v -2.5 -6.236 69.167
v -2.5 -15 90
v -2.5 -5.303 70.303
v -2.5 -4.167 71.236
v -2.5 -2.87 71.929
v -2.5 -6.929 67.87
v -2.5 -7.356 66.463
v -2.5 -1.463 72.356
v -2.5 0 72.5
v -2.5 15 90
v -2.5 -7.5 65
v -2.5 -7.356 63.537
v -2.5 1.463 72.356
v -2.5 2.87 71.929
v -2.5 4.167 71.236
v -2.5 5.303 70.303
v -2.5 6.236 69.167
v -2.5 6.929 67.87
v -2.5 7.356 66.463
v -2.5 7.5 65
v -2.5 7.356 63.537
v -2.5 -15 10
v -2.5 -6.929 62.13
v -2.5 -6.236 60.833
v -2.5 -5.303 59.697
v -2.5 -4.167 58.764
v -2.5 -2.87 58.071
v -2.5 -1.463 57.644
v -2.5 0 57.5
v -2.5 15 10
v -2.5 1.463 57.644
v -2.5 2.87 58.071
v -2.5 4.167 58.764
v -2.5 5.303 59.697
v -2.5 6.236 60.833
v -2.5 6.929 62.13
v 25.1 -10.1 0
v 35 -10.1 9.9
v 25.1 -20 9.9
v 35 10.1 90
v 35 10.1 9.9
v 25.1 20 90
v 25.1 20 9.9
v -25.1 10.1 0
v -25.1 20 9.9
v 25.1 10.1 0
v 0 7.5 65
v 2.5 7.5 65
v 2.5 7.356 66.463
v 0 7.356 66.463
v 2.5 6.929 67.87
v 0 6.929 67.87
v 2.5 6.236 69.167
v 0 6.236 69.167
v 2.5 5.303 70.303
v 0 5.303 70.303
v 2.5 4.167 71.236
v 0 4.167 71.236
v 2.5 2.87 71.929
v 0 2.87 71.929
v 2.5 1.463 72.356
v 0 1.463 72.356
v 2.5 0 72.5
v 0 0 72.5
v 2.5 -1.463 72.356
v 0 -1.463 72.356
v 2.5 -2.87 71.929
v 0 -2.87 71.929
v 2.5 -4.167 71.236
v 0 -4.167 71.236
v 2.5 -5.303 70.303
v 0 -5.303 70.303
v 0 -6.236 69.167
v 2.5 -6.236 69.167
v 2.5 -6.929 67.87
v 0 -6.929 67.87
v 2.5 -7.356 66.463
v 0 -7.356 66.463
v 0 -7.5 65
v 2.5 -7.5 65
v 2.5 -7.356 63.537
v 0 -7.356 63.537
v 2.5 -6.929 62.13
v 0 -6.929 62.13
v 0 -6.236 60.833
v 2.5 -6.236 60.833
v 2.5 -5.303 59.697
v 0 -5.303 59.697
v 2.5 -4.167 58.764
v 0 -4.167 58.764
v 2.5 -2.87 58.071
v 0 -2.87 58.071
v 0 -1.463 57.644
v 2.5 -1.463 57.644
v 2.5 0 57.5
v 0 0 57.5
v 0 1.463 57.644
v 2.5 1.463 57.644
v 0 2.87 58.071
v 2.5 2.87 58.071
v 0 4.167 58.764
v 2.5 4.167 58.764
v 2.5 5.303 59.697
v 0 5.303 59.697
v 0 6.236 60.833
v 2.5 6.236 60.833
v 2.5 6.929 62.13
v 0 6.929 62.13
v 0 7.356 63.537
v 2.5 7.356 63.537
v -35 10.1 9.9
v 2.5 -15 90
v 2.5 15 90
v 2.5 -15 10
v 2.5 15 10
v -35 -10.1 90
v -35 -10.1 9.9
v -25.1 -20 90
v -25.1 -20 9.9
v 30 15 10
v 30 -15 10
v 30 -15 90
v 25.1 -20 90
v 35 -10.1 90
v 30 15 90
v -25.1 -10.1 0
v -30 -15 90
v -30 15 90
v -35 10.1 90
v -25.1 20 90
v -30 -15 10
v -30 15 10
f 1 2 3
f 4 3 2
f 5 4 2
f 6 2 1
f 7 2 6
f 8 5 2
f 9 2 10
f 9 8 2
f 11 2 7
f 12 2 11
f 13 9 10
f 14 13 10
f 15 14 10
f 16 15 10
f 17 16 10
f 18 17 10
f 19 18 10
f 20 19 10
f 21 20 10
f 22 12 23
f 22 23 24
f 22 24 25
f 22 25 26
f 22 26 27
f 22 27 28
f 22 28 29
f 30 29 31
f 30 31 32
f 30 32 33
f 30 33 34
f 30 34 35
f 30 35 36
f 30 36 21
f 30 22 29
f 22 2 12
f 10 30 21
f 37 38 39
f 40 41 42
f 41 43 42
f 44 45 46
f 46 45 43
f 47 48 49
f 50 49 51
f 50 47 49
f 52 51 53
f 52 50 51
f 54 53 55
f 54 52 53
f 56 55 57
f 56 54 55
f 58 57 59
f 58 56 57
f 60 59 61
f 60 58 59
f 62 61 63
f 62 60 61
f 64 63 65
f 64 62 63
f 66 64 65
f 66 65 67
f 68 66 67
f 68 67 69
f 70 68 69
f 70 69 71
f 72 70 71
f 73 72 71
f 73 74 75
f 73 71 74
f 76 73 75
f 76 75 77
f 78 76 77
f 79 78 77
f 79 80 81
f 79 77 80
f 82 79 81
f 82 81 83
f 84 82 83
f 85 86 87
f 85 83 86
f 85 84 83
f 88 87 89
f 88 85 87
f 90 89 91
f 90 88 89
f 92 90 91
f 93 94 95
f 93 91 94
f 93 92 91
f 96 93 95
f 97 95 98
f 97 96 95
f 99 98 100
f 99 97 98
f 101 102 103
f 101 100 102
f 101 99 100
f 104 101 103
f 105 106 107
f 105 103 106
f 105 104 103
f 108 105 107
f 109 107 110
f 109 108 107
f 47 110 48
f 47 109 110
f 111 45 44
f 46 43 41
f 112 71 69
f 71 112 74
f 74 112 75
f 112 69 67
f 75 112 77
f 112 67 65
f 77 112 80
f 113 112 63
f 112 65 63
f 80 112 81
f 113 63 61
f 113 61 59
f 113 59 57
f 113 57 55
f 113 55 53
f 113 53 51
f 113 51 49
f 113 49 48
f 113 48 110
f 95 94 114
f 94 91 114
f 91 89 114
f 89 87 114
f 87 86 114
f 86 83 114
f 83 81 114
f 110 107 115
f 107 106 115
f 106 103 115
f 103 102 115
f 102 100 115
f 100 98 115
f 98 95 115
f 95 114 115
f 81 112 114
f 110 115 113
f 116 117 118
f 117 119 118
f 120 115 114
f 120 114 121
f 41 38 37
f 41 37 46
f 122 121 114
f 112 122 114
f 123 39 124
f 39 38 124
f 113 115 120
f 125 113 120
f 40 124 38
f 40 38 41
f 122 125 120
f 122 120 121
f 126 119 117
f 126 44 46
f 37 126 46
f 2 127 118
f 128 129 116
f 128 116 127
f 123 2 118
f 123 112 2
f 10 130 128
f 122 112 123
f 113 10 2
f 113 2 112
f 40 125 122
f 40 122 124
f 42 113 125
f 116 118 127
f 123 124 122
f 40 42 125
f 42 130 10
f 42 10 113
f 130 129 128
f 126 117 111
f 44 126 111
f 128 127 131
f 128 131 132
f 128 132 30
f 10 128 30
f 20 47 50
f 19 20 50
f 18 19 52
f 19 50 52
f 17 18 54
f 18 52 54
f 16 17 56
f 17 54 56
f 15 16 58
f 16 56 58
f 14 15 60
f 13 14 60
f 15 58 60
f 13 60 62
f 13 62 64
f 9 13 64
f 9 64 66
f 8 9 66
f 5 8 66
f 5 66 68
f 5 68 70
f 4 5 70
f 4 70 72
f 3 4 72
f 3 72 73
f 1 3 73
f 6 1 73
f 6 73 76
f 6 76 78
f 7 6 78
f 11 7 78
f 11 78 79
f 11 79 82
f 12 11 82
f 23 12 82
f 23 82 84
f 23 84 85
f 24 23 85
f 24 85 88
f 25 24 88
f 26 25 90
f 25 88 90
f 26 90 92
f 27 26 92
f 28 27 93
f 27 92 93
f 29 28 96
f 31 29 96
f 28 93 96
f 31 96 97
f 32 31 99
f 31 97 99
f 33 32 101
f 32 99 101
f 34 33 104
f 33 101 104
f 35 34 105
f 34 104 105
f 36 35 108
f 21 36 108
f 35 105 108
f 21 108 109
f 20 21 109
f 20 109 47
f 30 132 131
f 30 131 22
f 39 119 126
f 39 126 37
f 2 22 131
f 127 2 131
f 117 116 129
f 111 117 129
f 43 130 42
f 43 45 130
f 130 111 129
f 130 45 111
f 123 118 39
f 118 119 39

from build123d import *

# Parameters (mm, degrees)
F0_W          = 5
F0_H          = 30
F2_DEPTH      = 90
F0_W_2        = 70
F0_H_2        = 40
F3_DEPTH      = 90
F0_W_3        = 27.5
F4_DEPTH      = 10
F1_R          = 7.5
F5_DEPTH      = 15
F5_DEPTH_BACK = 25
F6_SIZE       = 9.9


with BuildPart() as f2:
    # F0 (on Top) → F2 (new body)
    with BuildSketch(Plane.XY):
        Rectangle(F0_W, F0_H)
    extrude(amount=F2_DEPTH)

    # F0 (on Top) → F3 (join)
    with BuildSketch(Plane.XY):
        Rectangle(F0_W_2, F0_H_2)
        Polygon((-30, -15), (-30, 15), (-2.5, 15), (2.5, 15), (30, 15), (30, -15), (2.5, -15), (-2.5, -15), align=None, mode=Mode.SUBTRACT)
    extrude(amount=F3_DEPTH)

    # F0 (on Top) → F4 (join)
    with BuildSketch(Plane.XY):
        with Locations((-16.25, 0)):
            Rectangle(F0_W_3, F0_H)
        with Locations((16.25, 0)):
            Rectangle(F0_W_3, F0_H)
    extrude(amount=F4_DEPTH)

    # F1 (on Right) → F5 (cut, two sides)
    with BuildSketch(Plane.YZ) as f5_sk:
        with Locations((0, 65)):
            Circle(F1_R)
    extrude(amount=F5_DEPTH, mode=Mode.SUBTRACT)
    extrude(f5_sk.sketch, amount=-F5_DEPTH_BACK, mode=Mode.SUBTRACT)

    # F6
    f6_edges = [f2.edges().sort_by_distance(p)[0] for p in [
        (35, -20, 45),
        (35, 20, 45),
        (-35, 20, 45),
        (-35, -20, 45),
        (0, 20, 0),
        (35, 0, 0),
        (0, -20, 0),
        (-35, 0, 0),
    ]]
    chamfer(f6_edges, length=F6_SIZE)


solid = f2.part
